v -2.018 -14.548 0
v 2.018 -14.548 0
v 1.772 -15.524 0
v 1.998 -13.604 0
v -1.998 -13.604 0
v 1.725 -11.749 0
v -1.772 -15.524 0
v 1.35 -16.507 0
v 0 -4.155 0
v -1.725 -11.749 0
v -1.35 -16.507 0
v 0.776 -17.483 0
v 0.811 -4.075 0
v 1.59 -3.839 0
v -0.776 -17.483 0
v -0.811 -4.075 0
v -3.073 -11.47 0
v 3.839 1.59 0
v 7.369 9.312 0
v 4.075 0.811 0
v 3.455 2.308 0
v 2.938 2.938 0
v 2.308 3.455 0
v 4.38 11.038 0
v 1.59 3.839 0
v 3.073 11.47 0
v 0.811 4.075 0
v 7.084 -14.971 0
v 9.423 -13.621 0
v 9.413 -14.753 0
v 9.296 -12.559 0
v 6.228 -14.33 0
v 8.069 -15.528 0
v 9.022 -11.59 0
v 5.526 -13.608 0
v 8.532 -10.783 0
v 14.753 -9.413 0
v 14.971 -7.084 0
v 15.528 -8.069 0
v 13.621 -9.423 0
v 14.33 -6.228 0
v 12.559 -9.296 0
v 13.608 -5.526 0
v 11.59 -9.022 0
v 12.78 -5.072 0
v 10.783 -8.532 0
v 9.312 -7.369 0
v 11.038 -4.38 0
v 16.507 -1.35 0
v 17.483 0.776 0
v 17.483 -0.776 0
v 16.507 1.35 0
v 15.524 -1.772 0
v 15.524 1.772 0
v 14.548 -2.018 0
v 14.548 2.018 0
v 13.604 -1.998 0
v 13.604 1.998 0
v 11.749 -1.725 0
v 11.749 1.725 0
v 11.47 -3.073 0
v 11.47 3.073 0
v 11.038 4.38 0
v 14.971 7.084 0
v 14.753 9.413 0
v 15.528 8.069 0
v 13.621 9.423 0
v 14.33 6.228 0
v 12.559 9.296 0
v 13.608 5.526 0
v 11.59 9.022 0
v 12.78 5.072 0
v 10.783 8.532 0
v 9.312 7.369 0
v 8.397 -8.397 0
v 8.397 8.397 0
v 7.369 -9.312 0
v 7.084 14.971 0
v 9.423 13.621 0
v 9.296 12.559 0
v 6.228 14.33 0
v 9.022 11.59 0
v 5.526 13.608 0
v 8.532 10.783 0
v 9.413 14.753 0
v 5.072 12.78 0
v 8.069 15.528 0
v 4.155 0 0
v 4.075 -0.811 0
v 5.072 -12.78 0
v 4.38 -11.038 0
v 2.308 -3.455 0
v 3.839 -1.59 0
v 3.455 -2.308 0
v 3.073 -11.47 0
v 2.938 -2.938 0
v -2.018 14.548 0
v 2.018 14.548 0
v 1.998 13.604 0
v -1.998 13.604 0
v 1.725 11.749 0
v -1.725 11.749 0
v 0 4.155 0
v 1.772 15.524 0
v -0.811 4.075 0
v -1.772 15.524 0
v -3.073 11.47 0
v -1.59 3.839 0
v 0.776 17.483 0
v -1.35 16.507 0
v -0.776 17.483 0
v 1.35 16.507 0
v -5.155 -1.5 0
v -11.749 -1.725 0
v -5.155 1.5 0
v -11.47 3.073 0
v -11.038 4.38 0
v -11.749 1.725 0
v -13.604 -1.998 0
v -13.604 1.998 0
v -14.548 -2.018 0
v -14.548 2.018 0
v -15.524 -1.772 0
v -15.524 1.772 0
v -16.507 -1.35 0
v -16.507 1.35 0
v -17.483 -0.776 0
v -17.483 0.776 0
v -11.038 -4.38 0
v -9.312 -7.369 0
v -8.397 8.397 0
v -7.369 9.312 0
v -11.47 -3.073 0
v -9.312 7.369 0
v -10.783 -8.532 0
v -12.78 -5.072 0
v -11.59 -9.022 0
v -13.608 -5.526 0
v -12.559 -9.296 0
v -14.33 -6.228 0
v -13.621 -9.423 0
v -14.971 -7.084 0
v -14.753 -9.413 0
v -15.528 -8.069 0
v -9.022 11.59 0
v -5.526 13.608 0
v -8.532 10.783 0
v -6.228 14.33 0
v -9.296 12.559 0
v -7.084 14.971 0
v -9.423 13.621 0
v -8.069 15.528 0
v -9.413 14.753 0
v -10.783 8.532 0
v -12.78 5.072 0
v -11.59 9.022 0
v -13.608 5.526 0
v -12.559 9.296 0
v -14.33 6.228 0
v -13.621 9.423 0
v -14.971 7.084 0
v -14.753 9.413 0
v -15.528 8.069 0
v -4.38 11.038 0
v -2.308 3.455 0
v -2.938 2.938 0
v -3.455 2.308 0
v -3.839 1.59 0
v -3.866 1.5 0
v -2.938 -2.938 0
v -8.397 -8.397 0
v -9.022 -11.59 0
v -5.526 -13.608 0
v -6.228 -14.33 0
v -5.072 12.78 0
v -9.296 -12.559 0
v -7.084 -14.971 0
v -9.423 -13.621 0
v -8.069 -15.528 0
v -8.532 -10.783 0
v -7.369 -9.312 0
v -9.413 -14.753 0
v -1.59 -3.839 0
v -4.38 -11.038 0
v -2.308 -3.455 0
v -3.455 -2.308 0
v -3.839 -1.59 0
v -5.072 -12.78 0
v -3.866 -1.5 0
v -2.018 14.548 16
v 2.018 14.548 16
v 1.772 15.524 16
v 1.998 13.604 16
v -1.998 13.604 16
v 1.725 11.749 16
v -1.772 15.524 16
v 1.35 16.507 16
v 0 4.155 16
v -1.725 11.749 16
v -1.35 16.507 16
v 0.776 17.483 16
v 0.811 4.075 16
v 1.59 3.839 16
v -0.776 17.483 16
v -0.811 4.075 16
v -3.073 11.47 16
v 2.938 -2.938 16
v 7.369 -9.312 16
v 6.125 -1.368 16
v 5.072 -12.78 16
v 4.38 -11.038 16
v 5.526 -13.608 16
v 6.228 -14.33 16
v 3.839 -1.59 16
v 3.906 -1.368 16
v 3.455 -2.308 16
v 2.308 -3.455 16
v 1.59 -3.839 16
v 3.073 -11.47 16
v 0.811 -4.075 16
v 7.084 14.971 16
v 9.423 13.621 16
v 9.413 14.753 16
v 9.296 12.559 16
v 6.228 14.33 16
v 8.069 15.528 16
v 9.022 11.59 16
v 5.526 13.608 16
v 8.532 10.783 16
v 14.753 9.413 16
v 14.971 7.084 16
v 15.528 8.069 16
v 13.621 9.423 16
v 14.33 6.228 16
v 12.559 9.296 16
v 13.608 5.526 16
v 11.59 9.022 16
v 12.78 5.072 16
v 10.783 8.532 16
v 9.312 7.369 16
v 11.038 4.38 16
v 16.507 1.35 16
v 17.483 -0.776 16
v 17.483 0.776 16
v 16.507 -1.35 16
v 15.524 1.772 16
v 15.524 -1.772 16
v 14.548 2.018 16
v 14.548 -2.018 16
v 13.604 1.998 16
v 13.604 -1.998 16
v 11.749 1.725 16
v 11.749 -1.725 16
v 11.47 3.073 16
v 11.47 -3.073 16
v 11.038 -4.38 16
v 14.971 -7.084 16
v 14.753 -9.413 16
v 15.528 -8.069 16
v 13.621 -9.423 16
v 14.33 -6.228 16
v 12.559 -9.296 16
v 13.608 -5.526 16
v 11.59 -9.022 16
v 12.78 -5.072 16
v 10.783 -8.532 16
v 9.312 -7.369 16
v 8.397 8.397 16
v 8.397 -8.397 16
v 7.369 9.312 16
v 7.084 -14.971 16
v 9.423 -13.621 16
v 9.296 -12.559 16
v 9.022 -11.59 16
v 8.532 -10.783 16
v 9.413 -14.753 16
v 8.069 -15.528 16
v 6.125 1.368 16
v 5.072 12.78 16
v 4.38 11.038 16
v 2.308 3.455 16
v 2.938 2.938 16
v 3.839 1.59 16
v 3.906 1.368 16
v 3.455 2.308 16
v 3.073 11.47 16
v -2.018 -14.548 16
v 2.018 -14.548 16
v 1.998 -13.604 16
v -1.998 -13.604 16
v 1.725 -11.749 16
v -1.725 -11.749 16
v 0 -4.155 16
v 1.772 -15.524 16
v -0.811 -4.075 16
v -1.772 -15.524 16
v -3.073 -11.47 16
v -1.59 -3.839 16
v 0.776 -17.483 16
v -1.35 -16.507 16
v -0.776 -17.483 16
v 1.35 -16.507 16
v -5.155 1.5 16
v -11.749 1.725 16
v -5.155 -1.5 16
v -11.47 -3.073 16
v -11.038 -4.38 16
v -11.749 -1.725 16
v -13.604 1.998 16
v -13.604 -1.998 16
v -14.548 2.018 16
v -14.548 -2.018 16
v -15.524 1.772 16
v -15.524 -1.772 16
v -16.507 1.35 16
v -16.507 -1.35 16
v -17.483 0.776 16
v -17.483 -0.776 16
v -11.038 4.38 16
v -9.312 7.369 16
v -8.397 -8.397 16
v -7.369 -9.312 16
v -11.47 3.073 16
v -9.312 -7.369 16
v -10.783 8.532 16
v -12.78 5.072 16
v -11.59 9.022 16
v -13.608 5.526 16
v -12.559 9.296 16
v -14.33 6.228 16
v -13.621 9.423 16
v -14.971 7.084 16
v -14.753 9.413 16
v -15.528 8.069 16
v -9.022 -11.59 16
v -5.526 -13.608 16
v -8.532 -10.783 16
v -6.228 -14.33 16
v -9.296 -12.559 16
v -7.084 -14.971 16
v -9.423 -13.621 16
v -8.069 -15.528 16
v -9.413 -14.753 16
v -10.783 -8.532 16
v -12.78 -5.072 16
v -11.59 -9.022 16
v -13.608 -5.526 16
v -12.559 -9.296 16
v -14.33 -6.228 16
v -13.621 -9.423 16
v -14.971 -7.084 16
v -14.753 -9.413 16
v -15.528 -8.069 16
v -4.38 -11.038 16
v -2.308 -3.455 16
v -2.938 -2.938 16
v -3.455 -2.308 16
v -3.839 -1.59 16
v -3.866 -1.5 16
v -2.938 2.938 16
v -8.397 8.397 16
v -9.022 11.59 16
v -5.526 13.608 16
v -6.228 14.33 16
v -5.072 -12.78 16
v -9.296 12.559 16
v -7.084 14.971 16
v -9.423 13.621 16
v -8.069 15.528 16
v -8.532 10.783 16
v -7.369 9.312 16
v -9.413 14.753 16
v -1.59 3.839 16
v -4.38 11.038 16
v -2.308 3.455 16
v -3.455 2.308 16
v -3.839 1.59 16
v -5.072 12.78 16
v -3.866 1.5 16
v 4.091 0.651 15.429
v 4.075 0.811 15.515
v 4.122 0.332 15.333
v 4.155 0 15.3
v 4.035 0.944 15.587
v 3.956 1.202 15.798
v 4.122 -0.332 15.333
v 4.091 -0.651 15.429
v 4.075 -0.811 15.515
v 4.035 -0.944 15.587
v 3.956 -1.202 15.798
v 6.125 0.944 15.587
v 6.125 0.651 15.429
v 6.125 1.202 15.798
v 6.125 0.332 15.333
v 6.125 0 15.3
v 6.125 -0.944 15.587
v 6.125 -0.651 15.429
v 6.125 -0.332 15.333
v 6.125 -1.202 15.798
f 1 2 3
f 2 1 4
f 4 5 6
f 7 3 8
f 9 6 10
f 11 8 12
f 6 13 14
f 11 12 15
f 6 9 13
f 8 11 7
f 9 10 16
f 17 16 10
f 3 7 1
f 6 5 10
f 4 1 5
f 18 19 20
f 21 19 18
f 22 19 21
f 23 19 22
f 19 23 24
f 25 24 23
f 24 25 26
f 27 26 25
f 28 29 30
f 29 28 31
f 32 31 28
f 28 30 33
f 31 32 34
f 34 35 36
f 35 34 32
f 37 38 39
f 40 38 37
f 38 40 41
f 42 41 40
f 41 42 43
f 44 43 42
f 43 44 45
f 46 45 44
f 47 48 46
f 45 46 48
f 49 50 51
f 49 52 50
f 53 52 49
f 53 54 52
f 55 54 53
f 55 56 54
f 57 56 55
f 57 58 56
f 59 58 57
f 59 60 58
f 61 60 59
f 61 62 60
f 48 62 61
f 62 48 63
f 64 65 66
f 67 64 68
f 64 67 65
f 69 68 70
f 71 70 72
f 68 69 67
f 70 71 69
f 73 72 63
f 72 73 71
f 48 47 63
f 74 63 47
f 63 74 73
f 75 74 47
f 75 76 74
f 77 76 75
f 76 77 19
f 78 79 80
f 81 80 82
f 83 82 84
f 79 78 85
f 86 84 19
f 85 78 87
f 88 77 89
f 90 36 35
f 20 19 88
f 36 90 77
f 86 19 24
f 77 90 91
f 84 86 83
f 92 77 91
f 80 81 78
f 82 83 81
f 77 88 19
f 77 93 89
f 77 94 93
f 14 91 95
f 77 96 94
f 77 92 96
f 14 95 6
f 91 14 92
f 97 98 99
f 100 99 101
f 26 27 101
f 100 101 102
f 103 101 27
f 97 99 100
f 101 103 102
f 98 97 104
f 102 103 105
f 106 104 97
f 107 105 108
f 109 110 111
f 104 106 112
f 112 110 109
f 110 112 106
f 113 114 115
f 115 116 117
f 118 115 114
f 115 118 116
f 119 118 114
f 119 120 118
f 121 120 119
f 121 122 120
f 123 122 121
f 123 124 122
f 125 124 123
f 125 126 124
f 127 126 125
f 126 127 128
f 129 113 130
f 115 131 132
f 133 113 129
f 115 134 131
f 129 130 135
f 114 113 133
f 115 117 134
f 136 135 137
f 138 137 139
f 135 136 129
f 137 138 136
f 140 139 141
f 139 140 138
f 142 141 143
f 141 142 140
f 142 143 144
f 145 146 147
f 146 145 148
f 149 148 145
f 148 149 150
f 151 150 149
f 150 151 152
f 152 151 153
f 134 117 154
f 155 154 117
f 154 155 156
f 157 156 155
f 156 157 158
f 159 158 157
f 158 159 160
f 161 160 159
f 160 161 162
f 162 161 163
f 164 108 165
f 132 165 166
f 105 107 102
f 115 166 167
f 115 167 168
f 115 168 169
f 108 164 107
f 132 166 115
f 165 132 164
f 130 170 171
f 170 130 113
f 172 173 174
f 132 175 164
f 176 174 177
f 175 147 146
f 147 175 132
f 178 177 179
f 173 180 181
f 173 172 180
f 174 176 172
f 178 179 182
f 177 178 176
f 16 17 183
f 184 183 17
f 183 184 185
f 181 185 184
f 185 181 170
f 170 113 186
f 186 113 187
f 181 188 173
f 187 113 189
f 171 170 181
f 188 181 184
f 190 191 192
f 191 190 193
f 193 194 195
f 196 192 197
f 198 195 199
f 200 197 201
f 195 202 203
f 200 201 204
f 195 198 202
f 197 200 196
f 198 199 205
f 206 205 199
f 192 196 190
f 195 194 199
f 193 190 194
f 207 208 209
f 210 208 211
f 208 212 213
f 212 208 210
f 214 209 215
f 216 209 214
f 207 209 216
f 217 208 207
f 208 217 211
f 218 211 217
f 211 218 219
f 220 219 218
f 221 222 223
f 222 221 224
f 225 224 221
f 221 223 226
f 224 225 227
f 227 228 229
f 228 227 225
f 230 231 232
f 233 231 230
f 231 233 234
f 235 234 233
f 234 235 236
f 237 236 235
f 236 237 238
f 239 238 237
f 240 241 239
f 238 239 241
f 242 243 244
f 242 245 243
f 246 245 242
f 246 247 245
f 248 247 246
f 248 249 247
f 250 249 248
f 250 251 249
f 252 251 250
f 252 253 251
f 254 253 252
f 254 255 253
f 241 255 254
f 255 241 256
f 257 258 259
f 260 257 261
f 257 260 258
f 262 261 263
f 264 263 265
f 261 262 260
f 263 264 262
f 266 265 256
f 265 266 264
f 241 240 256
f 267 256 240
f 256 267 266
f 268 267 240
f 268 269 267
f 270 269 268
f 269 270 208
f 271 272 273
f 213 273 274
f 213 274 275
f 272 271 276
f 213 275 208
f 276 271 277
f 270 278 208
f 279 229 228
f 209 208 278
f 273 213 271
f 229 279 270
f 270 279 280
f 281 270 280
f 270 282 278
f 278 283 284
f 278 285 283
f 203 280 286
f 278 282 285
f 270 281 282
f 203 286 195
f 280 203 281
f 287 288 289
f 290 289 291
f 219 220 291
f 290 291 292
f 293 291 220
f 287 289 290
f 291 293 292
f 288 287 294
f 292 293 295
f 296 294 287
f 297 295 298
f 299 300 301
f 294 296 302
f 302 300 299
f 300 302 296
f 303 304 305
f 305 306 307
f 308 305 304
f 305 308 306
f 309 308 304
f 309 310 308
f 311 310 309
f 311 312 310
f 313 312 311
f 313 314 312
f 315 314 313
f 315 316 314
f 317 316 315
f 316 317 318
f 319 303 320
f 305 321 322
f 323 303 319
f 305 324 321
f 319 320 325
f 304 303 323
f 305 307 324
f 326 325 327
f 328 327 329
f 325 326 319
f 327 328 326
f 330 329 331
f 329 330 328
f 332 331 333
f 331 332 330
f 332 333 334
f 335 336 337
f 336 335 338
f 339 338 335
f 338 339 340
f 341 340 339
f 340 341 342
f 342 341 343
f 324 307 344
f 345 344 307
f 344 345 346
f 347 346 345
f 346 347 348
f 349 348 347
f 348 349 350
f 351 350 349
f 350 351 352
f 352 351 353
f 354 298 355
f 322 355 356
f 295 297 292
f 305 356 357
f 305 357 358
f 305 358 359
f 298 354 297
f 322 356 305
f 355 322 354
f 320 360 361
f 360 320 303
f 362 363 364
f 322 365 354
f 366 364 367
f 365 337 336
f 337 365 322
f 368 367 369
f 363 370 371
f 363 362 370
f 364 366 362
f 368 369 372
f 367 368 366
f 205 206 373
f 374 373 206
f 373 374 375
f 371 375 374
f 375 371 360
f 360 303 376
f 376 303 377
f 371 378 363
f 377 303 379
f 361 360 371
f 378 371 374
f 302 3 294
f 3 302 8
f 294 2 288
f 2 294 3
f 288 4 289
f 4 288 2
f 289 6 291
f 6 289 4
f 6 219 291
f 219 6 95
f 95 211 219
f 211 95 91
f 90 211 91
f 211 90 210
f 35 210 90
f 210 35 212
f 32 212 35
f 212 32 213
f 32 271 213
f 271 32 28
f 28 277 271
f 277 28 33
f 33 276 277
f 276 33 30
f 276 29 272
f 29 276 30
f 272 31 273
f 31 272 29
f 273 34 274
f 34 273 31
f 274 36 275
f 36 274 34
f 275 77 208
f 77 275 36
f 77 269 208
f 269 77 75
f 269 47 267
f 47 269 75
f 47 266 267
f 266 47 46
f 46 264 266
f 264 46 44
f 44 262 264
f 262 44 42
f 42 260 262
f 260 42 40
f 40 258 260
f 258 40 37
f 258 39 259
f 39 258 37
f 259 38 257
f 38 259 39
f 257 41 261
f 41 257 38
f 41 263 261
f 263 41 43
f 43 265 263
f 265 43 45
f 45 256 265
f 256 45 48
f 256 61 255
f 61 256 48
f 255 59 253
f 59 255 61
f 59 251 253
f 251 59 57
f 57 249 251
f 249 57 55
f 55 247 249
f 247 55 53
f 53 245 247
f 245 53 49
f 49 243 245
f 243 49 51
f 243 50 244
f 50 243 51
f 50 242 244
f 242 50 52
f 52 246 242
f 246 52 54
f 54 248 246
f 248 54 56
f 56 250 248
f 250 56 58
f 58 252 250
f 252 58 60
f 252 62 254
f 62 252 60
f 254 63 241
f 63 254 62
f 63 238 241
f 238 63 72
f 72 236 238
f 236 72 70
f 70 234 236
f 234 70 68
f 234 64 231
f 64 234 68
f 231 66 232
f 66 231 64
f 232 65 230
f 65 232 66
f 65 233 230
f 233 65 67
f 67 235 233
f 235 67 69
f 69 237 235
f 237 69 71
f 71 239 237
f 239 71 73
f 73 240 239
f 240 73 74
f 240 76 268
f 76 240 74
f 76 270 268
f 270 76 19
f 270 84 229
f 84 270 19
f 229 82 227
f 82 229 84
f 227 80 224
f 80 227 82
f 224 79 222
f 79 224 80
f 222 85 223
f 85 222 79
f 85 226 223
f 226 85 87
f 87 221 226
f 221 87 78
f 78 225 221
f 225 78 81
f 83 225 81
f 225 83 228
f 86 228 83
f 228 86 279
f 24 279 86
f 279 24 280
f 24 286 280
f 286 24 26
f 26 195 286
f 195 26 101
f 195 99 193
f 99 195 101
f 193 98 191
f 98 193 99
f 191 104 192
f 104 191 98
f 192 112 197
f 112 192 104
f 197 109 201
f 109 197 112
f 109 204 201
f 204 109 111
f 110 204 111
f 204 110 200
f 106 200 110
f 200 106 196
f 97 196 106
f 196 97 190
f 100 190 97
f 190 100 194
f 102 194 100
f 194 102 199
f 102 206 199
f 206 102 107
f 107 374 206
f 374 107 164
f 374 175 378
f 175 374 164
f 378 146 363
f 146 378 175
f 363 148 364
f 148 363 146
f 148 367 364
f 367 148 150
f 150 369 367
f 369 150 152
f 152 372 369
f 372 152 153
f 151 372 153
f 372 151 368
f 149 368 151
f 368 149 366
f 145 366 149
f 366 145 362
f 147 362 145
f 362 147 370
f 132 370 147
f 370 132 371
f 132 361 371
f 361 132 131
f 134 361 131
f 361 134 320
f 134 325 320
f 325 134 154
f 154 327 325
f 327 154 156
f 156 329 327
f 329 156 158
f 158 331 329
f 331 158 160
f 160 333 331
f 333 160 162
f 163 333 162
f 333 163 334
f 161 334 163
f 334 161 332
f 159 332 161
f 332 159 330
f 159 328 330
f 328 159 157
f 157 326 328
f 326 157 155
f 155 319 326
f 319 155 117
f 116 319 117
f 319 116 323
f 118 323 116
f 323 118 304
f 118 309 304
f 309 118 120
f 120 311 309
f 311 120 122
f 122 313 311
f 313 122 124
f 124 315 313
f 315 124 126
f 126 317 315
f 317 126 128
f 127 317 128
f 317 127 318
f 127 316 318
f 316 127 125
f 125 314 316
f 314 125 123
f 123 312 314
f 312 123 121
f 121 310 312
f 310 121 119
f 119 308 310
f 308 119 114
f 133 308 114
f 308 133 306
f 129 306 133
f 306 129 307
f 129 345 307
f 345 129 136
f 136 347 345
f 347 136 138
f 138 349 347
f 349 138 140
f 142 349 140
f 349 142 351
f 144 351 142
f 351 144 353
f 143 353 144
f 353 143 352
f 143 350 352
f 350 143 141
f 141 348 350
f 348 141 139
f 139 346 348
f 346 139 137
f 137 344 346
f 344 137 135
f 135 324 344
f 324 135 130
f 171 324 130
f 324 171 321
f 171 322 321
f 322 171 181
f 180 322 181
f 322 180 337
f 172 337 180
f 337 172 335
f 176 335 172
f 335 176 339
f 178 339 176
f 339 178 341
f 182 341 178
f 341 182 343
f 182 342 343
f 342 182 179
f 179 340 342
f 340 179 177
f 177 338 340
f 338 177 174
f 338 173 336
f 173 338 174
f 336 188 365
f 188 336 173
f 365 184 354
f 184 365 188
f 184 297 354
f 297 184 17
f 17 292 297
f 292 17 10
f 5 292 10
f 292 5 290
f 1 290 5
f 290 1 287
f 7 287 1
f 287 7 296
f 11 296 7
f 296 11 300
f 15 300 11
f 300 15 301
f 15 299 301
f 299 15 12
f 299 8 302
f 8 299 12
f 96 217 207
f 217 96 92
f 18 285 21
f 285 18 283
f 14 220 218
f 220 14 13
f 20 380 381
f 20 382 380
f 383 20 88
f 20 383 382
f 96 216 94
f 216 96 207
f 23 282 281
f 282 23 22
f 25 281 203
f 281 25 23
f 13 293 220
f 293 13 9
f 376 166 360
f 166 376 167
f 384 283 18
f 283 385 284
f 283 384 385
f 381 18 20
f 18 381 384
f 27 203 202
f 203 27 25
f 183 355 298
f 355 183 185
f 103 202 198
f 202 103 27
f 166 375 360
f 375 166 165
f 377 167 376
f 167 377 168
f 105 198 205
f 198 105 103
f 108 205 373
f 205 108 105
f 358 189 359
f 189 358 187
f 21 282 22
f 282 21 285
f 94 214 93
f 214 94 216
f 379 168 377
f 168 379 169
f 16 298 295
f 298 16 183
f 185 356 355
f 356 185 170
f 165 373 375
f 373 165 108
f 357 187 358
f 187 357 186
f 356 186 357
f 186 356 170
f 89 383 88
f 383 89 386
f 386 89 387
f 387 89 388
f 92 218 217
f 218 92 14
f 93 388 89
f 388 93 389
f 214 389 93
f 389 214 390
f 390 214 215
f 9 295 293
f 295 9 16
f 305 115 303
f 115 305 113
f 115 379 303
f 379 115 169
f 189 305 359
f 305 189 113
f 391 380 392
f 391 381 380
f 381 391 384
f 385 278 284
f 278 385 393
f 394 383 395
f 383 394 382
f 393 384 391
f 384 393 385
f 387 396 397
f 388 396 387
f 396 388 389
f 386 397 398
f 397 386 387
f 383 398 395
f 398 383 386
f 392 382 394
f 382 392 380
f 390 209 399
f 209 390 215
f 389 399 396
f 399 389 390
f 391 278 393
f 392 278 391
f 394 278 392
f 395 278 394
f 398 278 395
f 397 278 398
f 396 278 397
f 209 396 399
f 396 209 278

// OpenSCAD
$fn = 32;

// ----------------------------------------------------------------------
// Spur gear: m=2.5 z=12, 35 mm tip diameter x 16 mm
// ----------------------------------------------------------------------

// --- parameters (mm) ---
modul = 2.5;              // module
n_teeth = 12;             // number of teeth
width = 16;               // face width
pa = 20;                  // pressure angle, deg
shaft_d = 8.31;           // shaft bore
key_w = 3;                // keyway width
key_h = 1.4;              // keyway depth
set_d = 3.4;              // set screw tap hole
set_z = 17;               // set screw height

/* --- involute profile --- */
pitch_r = modul * n_teeth / 2;
base_r = pitch_r * cos(pa);
tip_r = pitch_r + modul;
root_r = pitch_r - 1.25 * modul;
flank_steps = 6;

function inv_deg(a) = (tan(a) - a * PI / 180) * 180 / PI;
function flank_r(i) = root_r + (tip_r - root_r) * i / flank_steps;
function half_angle(r) = 90 / n_teeth + inv_deg(pa) - inv_deg(acos(min(1, base_r / r)));
function tooth_pt(k, i, side) =
    let (r = flank_r(i), a = k * 360 / n_teeth + side * half_angle(r))
    [r * cos(a), r * sin(a)];

module tooth_profile() {
  polygon(points = [
    for (k = [0 : n_teeth - 1])
      each [
        for (i = [0 : flank_steps]) tooth_pt(k, i, -1),
        for (i = [flank_steps : -1 : 0]) tooth_pt(k, i, 1),
        let (ta = (k + 0.5) * 360 / n_teeth)
          [root_r * cos(ta), root_r * sin(ta)]
      ]
  ]);
}

module gear_disc() {
  linear_extrude(height = width) tooth_profile();
}

difference() {
  gear_disc();
  translate([0, 0, -1]) cylinder(h = width + 3, d = shaft_d);
  /* keyway on the bore */
  translate([-shaft_d / 2 - 1, -key_w / 2, -1]) cube([key_h + 1, key_w, width + 3]);
  /* set screw, drilled radially */
  translate([-1, 0, set_z]) rotate([0, 90, 0]) cylinder(h = (root_r * 0.6), d = set_d);
}
